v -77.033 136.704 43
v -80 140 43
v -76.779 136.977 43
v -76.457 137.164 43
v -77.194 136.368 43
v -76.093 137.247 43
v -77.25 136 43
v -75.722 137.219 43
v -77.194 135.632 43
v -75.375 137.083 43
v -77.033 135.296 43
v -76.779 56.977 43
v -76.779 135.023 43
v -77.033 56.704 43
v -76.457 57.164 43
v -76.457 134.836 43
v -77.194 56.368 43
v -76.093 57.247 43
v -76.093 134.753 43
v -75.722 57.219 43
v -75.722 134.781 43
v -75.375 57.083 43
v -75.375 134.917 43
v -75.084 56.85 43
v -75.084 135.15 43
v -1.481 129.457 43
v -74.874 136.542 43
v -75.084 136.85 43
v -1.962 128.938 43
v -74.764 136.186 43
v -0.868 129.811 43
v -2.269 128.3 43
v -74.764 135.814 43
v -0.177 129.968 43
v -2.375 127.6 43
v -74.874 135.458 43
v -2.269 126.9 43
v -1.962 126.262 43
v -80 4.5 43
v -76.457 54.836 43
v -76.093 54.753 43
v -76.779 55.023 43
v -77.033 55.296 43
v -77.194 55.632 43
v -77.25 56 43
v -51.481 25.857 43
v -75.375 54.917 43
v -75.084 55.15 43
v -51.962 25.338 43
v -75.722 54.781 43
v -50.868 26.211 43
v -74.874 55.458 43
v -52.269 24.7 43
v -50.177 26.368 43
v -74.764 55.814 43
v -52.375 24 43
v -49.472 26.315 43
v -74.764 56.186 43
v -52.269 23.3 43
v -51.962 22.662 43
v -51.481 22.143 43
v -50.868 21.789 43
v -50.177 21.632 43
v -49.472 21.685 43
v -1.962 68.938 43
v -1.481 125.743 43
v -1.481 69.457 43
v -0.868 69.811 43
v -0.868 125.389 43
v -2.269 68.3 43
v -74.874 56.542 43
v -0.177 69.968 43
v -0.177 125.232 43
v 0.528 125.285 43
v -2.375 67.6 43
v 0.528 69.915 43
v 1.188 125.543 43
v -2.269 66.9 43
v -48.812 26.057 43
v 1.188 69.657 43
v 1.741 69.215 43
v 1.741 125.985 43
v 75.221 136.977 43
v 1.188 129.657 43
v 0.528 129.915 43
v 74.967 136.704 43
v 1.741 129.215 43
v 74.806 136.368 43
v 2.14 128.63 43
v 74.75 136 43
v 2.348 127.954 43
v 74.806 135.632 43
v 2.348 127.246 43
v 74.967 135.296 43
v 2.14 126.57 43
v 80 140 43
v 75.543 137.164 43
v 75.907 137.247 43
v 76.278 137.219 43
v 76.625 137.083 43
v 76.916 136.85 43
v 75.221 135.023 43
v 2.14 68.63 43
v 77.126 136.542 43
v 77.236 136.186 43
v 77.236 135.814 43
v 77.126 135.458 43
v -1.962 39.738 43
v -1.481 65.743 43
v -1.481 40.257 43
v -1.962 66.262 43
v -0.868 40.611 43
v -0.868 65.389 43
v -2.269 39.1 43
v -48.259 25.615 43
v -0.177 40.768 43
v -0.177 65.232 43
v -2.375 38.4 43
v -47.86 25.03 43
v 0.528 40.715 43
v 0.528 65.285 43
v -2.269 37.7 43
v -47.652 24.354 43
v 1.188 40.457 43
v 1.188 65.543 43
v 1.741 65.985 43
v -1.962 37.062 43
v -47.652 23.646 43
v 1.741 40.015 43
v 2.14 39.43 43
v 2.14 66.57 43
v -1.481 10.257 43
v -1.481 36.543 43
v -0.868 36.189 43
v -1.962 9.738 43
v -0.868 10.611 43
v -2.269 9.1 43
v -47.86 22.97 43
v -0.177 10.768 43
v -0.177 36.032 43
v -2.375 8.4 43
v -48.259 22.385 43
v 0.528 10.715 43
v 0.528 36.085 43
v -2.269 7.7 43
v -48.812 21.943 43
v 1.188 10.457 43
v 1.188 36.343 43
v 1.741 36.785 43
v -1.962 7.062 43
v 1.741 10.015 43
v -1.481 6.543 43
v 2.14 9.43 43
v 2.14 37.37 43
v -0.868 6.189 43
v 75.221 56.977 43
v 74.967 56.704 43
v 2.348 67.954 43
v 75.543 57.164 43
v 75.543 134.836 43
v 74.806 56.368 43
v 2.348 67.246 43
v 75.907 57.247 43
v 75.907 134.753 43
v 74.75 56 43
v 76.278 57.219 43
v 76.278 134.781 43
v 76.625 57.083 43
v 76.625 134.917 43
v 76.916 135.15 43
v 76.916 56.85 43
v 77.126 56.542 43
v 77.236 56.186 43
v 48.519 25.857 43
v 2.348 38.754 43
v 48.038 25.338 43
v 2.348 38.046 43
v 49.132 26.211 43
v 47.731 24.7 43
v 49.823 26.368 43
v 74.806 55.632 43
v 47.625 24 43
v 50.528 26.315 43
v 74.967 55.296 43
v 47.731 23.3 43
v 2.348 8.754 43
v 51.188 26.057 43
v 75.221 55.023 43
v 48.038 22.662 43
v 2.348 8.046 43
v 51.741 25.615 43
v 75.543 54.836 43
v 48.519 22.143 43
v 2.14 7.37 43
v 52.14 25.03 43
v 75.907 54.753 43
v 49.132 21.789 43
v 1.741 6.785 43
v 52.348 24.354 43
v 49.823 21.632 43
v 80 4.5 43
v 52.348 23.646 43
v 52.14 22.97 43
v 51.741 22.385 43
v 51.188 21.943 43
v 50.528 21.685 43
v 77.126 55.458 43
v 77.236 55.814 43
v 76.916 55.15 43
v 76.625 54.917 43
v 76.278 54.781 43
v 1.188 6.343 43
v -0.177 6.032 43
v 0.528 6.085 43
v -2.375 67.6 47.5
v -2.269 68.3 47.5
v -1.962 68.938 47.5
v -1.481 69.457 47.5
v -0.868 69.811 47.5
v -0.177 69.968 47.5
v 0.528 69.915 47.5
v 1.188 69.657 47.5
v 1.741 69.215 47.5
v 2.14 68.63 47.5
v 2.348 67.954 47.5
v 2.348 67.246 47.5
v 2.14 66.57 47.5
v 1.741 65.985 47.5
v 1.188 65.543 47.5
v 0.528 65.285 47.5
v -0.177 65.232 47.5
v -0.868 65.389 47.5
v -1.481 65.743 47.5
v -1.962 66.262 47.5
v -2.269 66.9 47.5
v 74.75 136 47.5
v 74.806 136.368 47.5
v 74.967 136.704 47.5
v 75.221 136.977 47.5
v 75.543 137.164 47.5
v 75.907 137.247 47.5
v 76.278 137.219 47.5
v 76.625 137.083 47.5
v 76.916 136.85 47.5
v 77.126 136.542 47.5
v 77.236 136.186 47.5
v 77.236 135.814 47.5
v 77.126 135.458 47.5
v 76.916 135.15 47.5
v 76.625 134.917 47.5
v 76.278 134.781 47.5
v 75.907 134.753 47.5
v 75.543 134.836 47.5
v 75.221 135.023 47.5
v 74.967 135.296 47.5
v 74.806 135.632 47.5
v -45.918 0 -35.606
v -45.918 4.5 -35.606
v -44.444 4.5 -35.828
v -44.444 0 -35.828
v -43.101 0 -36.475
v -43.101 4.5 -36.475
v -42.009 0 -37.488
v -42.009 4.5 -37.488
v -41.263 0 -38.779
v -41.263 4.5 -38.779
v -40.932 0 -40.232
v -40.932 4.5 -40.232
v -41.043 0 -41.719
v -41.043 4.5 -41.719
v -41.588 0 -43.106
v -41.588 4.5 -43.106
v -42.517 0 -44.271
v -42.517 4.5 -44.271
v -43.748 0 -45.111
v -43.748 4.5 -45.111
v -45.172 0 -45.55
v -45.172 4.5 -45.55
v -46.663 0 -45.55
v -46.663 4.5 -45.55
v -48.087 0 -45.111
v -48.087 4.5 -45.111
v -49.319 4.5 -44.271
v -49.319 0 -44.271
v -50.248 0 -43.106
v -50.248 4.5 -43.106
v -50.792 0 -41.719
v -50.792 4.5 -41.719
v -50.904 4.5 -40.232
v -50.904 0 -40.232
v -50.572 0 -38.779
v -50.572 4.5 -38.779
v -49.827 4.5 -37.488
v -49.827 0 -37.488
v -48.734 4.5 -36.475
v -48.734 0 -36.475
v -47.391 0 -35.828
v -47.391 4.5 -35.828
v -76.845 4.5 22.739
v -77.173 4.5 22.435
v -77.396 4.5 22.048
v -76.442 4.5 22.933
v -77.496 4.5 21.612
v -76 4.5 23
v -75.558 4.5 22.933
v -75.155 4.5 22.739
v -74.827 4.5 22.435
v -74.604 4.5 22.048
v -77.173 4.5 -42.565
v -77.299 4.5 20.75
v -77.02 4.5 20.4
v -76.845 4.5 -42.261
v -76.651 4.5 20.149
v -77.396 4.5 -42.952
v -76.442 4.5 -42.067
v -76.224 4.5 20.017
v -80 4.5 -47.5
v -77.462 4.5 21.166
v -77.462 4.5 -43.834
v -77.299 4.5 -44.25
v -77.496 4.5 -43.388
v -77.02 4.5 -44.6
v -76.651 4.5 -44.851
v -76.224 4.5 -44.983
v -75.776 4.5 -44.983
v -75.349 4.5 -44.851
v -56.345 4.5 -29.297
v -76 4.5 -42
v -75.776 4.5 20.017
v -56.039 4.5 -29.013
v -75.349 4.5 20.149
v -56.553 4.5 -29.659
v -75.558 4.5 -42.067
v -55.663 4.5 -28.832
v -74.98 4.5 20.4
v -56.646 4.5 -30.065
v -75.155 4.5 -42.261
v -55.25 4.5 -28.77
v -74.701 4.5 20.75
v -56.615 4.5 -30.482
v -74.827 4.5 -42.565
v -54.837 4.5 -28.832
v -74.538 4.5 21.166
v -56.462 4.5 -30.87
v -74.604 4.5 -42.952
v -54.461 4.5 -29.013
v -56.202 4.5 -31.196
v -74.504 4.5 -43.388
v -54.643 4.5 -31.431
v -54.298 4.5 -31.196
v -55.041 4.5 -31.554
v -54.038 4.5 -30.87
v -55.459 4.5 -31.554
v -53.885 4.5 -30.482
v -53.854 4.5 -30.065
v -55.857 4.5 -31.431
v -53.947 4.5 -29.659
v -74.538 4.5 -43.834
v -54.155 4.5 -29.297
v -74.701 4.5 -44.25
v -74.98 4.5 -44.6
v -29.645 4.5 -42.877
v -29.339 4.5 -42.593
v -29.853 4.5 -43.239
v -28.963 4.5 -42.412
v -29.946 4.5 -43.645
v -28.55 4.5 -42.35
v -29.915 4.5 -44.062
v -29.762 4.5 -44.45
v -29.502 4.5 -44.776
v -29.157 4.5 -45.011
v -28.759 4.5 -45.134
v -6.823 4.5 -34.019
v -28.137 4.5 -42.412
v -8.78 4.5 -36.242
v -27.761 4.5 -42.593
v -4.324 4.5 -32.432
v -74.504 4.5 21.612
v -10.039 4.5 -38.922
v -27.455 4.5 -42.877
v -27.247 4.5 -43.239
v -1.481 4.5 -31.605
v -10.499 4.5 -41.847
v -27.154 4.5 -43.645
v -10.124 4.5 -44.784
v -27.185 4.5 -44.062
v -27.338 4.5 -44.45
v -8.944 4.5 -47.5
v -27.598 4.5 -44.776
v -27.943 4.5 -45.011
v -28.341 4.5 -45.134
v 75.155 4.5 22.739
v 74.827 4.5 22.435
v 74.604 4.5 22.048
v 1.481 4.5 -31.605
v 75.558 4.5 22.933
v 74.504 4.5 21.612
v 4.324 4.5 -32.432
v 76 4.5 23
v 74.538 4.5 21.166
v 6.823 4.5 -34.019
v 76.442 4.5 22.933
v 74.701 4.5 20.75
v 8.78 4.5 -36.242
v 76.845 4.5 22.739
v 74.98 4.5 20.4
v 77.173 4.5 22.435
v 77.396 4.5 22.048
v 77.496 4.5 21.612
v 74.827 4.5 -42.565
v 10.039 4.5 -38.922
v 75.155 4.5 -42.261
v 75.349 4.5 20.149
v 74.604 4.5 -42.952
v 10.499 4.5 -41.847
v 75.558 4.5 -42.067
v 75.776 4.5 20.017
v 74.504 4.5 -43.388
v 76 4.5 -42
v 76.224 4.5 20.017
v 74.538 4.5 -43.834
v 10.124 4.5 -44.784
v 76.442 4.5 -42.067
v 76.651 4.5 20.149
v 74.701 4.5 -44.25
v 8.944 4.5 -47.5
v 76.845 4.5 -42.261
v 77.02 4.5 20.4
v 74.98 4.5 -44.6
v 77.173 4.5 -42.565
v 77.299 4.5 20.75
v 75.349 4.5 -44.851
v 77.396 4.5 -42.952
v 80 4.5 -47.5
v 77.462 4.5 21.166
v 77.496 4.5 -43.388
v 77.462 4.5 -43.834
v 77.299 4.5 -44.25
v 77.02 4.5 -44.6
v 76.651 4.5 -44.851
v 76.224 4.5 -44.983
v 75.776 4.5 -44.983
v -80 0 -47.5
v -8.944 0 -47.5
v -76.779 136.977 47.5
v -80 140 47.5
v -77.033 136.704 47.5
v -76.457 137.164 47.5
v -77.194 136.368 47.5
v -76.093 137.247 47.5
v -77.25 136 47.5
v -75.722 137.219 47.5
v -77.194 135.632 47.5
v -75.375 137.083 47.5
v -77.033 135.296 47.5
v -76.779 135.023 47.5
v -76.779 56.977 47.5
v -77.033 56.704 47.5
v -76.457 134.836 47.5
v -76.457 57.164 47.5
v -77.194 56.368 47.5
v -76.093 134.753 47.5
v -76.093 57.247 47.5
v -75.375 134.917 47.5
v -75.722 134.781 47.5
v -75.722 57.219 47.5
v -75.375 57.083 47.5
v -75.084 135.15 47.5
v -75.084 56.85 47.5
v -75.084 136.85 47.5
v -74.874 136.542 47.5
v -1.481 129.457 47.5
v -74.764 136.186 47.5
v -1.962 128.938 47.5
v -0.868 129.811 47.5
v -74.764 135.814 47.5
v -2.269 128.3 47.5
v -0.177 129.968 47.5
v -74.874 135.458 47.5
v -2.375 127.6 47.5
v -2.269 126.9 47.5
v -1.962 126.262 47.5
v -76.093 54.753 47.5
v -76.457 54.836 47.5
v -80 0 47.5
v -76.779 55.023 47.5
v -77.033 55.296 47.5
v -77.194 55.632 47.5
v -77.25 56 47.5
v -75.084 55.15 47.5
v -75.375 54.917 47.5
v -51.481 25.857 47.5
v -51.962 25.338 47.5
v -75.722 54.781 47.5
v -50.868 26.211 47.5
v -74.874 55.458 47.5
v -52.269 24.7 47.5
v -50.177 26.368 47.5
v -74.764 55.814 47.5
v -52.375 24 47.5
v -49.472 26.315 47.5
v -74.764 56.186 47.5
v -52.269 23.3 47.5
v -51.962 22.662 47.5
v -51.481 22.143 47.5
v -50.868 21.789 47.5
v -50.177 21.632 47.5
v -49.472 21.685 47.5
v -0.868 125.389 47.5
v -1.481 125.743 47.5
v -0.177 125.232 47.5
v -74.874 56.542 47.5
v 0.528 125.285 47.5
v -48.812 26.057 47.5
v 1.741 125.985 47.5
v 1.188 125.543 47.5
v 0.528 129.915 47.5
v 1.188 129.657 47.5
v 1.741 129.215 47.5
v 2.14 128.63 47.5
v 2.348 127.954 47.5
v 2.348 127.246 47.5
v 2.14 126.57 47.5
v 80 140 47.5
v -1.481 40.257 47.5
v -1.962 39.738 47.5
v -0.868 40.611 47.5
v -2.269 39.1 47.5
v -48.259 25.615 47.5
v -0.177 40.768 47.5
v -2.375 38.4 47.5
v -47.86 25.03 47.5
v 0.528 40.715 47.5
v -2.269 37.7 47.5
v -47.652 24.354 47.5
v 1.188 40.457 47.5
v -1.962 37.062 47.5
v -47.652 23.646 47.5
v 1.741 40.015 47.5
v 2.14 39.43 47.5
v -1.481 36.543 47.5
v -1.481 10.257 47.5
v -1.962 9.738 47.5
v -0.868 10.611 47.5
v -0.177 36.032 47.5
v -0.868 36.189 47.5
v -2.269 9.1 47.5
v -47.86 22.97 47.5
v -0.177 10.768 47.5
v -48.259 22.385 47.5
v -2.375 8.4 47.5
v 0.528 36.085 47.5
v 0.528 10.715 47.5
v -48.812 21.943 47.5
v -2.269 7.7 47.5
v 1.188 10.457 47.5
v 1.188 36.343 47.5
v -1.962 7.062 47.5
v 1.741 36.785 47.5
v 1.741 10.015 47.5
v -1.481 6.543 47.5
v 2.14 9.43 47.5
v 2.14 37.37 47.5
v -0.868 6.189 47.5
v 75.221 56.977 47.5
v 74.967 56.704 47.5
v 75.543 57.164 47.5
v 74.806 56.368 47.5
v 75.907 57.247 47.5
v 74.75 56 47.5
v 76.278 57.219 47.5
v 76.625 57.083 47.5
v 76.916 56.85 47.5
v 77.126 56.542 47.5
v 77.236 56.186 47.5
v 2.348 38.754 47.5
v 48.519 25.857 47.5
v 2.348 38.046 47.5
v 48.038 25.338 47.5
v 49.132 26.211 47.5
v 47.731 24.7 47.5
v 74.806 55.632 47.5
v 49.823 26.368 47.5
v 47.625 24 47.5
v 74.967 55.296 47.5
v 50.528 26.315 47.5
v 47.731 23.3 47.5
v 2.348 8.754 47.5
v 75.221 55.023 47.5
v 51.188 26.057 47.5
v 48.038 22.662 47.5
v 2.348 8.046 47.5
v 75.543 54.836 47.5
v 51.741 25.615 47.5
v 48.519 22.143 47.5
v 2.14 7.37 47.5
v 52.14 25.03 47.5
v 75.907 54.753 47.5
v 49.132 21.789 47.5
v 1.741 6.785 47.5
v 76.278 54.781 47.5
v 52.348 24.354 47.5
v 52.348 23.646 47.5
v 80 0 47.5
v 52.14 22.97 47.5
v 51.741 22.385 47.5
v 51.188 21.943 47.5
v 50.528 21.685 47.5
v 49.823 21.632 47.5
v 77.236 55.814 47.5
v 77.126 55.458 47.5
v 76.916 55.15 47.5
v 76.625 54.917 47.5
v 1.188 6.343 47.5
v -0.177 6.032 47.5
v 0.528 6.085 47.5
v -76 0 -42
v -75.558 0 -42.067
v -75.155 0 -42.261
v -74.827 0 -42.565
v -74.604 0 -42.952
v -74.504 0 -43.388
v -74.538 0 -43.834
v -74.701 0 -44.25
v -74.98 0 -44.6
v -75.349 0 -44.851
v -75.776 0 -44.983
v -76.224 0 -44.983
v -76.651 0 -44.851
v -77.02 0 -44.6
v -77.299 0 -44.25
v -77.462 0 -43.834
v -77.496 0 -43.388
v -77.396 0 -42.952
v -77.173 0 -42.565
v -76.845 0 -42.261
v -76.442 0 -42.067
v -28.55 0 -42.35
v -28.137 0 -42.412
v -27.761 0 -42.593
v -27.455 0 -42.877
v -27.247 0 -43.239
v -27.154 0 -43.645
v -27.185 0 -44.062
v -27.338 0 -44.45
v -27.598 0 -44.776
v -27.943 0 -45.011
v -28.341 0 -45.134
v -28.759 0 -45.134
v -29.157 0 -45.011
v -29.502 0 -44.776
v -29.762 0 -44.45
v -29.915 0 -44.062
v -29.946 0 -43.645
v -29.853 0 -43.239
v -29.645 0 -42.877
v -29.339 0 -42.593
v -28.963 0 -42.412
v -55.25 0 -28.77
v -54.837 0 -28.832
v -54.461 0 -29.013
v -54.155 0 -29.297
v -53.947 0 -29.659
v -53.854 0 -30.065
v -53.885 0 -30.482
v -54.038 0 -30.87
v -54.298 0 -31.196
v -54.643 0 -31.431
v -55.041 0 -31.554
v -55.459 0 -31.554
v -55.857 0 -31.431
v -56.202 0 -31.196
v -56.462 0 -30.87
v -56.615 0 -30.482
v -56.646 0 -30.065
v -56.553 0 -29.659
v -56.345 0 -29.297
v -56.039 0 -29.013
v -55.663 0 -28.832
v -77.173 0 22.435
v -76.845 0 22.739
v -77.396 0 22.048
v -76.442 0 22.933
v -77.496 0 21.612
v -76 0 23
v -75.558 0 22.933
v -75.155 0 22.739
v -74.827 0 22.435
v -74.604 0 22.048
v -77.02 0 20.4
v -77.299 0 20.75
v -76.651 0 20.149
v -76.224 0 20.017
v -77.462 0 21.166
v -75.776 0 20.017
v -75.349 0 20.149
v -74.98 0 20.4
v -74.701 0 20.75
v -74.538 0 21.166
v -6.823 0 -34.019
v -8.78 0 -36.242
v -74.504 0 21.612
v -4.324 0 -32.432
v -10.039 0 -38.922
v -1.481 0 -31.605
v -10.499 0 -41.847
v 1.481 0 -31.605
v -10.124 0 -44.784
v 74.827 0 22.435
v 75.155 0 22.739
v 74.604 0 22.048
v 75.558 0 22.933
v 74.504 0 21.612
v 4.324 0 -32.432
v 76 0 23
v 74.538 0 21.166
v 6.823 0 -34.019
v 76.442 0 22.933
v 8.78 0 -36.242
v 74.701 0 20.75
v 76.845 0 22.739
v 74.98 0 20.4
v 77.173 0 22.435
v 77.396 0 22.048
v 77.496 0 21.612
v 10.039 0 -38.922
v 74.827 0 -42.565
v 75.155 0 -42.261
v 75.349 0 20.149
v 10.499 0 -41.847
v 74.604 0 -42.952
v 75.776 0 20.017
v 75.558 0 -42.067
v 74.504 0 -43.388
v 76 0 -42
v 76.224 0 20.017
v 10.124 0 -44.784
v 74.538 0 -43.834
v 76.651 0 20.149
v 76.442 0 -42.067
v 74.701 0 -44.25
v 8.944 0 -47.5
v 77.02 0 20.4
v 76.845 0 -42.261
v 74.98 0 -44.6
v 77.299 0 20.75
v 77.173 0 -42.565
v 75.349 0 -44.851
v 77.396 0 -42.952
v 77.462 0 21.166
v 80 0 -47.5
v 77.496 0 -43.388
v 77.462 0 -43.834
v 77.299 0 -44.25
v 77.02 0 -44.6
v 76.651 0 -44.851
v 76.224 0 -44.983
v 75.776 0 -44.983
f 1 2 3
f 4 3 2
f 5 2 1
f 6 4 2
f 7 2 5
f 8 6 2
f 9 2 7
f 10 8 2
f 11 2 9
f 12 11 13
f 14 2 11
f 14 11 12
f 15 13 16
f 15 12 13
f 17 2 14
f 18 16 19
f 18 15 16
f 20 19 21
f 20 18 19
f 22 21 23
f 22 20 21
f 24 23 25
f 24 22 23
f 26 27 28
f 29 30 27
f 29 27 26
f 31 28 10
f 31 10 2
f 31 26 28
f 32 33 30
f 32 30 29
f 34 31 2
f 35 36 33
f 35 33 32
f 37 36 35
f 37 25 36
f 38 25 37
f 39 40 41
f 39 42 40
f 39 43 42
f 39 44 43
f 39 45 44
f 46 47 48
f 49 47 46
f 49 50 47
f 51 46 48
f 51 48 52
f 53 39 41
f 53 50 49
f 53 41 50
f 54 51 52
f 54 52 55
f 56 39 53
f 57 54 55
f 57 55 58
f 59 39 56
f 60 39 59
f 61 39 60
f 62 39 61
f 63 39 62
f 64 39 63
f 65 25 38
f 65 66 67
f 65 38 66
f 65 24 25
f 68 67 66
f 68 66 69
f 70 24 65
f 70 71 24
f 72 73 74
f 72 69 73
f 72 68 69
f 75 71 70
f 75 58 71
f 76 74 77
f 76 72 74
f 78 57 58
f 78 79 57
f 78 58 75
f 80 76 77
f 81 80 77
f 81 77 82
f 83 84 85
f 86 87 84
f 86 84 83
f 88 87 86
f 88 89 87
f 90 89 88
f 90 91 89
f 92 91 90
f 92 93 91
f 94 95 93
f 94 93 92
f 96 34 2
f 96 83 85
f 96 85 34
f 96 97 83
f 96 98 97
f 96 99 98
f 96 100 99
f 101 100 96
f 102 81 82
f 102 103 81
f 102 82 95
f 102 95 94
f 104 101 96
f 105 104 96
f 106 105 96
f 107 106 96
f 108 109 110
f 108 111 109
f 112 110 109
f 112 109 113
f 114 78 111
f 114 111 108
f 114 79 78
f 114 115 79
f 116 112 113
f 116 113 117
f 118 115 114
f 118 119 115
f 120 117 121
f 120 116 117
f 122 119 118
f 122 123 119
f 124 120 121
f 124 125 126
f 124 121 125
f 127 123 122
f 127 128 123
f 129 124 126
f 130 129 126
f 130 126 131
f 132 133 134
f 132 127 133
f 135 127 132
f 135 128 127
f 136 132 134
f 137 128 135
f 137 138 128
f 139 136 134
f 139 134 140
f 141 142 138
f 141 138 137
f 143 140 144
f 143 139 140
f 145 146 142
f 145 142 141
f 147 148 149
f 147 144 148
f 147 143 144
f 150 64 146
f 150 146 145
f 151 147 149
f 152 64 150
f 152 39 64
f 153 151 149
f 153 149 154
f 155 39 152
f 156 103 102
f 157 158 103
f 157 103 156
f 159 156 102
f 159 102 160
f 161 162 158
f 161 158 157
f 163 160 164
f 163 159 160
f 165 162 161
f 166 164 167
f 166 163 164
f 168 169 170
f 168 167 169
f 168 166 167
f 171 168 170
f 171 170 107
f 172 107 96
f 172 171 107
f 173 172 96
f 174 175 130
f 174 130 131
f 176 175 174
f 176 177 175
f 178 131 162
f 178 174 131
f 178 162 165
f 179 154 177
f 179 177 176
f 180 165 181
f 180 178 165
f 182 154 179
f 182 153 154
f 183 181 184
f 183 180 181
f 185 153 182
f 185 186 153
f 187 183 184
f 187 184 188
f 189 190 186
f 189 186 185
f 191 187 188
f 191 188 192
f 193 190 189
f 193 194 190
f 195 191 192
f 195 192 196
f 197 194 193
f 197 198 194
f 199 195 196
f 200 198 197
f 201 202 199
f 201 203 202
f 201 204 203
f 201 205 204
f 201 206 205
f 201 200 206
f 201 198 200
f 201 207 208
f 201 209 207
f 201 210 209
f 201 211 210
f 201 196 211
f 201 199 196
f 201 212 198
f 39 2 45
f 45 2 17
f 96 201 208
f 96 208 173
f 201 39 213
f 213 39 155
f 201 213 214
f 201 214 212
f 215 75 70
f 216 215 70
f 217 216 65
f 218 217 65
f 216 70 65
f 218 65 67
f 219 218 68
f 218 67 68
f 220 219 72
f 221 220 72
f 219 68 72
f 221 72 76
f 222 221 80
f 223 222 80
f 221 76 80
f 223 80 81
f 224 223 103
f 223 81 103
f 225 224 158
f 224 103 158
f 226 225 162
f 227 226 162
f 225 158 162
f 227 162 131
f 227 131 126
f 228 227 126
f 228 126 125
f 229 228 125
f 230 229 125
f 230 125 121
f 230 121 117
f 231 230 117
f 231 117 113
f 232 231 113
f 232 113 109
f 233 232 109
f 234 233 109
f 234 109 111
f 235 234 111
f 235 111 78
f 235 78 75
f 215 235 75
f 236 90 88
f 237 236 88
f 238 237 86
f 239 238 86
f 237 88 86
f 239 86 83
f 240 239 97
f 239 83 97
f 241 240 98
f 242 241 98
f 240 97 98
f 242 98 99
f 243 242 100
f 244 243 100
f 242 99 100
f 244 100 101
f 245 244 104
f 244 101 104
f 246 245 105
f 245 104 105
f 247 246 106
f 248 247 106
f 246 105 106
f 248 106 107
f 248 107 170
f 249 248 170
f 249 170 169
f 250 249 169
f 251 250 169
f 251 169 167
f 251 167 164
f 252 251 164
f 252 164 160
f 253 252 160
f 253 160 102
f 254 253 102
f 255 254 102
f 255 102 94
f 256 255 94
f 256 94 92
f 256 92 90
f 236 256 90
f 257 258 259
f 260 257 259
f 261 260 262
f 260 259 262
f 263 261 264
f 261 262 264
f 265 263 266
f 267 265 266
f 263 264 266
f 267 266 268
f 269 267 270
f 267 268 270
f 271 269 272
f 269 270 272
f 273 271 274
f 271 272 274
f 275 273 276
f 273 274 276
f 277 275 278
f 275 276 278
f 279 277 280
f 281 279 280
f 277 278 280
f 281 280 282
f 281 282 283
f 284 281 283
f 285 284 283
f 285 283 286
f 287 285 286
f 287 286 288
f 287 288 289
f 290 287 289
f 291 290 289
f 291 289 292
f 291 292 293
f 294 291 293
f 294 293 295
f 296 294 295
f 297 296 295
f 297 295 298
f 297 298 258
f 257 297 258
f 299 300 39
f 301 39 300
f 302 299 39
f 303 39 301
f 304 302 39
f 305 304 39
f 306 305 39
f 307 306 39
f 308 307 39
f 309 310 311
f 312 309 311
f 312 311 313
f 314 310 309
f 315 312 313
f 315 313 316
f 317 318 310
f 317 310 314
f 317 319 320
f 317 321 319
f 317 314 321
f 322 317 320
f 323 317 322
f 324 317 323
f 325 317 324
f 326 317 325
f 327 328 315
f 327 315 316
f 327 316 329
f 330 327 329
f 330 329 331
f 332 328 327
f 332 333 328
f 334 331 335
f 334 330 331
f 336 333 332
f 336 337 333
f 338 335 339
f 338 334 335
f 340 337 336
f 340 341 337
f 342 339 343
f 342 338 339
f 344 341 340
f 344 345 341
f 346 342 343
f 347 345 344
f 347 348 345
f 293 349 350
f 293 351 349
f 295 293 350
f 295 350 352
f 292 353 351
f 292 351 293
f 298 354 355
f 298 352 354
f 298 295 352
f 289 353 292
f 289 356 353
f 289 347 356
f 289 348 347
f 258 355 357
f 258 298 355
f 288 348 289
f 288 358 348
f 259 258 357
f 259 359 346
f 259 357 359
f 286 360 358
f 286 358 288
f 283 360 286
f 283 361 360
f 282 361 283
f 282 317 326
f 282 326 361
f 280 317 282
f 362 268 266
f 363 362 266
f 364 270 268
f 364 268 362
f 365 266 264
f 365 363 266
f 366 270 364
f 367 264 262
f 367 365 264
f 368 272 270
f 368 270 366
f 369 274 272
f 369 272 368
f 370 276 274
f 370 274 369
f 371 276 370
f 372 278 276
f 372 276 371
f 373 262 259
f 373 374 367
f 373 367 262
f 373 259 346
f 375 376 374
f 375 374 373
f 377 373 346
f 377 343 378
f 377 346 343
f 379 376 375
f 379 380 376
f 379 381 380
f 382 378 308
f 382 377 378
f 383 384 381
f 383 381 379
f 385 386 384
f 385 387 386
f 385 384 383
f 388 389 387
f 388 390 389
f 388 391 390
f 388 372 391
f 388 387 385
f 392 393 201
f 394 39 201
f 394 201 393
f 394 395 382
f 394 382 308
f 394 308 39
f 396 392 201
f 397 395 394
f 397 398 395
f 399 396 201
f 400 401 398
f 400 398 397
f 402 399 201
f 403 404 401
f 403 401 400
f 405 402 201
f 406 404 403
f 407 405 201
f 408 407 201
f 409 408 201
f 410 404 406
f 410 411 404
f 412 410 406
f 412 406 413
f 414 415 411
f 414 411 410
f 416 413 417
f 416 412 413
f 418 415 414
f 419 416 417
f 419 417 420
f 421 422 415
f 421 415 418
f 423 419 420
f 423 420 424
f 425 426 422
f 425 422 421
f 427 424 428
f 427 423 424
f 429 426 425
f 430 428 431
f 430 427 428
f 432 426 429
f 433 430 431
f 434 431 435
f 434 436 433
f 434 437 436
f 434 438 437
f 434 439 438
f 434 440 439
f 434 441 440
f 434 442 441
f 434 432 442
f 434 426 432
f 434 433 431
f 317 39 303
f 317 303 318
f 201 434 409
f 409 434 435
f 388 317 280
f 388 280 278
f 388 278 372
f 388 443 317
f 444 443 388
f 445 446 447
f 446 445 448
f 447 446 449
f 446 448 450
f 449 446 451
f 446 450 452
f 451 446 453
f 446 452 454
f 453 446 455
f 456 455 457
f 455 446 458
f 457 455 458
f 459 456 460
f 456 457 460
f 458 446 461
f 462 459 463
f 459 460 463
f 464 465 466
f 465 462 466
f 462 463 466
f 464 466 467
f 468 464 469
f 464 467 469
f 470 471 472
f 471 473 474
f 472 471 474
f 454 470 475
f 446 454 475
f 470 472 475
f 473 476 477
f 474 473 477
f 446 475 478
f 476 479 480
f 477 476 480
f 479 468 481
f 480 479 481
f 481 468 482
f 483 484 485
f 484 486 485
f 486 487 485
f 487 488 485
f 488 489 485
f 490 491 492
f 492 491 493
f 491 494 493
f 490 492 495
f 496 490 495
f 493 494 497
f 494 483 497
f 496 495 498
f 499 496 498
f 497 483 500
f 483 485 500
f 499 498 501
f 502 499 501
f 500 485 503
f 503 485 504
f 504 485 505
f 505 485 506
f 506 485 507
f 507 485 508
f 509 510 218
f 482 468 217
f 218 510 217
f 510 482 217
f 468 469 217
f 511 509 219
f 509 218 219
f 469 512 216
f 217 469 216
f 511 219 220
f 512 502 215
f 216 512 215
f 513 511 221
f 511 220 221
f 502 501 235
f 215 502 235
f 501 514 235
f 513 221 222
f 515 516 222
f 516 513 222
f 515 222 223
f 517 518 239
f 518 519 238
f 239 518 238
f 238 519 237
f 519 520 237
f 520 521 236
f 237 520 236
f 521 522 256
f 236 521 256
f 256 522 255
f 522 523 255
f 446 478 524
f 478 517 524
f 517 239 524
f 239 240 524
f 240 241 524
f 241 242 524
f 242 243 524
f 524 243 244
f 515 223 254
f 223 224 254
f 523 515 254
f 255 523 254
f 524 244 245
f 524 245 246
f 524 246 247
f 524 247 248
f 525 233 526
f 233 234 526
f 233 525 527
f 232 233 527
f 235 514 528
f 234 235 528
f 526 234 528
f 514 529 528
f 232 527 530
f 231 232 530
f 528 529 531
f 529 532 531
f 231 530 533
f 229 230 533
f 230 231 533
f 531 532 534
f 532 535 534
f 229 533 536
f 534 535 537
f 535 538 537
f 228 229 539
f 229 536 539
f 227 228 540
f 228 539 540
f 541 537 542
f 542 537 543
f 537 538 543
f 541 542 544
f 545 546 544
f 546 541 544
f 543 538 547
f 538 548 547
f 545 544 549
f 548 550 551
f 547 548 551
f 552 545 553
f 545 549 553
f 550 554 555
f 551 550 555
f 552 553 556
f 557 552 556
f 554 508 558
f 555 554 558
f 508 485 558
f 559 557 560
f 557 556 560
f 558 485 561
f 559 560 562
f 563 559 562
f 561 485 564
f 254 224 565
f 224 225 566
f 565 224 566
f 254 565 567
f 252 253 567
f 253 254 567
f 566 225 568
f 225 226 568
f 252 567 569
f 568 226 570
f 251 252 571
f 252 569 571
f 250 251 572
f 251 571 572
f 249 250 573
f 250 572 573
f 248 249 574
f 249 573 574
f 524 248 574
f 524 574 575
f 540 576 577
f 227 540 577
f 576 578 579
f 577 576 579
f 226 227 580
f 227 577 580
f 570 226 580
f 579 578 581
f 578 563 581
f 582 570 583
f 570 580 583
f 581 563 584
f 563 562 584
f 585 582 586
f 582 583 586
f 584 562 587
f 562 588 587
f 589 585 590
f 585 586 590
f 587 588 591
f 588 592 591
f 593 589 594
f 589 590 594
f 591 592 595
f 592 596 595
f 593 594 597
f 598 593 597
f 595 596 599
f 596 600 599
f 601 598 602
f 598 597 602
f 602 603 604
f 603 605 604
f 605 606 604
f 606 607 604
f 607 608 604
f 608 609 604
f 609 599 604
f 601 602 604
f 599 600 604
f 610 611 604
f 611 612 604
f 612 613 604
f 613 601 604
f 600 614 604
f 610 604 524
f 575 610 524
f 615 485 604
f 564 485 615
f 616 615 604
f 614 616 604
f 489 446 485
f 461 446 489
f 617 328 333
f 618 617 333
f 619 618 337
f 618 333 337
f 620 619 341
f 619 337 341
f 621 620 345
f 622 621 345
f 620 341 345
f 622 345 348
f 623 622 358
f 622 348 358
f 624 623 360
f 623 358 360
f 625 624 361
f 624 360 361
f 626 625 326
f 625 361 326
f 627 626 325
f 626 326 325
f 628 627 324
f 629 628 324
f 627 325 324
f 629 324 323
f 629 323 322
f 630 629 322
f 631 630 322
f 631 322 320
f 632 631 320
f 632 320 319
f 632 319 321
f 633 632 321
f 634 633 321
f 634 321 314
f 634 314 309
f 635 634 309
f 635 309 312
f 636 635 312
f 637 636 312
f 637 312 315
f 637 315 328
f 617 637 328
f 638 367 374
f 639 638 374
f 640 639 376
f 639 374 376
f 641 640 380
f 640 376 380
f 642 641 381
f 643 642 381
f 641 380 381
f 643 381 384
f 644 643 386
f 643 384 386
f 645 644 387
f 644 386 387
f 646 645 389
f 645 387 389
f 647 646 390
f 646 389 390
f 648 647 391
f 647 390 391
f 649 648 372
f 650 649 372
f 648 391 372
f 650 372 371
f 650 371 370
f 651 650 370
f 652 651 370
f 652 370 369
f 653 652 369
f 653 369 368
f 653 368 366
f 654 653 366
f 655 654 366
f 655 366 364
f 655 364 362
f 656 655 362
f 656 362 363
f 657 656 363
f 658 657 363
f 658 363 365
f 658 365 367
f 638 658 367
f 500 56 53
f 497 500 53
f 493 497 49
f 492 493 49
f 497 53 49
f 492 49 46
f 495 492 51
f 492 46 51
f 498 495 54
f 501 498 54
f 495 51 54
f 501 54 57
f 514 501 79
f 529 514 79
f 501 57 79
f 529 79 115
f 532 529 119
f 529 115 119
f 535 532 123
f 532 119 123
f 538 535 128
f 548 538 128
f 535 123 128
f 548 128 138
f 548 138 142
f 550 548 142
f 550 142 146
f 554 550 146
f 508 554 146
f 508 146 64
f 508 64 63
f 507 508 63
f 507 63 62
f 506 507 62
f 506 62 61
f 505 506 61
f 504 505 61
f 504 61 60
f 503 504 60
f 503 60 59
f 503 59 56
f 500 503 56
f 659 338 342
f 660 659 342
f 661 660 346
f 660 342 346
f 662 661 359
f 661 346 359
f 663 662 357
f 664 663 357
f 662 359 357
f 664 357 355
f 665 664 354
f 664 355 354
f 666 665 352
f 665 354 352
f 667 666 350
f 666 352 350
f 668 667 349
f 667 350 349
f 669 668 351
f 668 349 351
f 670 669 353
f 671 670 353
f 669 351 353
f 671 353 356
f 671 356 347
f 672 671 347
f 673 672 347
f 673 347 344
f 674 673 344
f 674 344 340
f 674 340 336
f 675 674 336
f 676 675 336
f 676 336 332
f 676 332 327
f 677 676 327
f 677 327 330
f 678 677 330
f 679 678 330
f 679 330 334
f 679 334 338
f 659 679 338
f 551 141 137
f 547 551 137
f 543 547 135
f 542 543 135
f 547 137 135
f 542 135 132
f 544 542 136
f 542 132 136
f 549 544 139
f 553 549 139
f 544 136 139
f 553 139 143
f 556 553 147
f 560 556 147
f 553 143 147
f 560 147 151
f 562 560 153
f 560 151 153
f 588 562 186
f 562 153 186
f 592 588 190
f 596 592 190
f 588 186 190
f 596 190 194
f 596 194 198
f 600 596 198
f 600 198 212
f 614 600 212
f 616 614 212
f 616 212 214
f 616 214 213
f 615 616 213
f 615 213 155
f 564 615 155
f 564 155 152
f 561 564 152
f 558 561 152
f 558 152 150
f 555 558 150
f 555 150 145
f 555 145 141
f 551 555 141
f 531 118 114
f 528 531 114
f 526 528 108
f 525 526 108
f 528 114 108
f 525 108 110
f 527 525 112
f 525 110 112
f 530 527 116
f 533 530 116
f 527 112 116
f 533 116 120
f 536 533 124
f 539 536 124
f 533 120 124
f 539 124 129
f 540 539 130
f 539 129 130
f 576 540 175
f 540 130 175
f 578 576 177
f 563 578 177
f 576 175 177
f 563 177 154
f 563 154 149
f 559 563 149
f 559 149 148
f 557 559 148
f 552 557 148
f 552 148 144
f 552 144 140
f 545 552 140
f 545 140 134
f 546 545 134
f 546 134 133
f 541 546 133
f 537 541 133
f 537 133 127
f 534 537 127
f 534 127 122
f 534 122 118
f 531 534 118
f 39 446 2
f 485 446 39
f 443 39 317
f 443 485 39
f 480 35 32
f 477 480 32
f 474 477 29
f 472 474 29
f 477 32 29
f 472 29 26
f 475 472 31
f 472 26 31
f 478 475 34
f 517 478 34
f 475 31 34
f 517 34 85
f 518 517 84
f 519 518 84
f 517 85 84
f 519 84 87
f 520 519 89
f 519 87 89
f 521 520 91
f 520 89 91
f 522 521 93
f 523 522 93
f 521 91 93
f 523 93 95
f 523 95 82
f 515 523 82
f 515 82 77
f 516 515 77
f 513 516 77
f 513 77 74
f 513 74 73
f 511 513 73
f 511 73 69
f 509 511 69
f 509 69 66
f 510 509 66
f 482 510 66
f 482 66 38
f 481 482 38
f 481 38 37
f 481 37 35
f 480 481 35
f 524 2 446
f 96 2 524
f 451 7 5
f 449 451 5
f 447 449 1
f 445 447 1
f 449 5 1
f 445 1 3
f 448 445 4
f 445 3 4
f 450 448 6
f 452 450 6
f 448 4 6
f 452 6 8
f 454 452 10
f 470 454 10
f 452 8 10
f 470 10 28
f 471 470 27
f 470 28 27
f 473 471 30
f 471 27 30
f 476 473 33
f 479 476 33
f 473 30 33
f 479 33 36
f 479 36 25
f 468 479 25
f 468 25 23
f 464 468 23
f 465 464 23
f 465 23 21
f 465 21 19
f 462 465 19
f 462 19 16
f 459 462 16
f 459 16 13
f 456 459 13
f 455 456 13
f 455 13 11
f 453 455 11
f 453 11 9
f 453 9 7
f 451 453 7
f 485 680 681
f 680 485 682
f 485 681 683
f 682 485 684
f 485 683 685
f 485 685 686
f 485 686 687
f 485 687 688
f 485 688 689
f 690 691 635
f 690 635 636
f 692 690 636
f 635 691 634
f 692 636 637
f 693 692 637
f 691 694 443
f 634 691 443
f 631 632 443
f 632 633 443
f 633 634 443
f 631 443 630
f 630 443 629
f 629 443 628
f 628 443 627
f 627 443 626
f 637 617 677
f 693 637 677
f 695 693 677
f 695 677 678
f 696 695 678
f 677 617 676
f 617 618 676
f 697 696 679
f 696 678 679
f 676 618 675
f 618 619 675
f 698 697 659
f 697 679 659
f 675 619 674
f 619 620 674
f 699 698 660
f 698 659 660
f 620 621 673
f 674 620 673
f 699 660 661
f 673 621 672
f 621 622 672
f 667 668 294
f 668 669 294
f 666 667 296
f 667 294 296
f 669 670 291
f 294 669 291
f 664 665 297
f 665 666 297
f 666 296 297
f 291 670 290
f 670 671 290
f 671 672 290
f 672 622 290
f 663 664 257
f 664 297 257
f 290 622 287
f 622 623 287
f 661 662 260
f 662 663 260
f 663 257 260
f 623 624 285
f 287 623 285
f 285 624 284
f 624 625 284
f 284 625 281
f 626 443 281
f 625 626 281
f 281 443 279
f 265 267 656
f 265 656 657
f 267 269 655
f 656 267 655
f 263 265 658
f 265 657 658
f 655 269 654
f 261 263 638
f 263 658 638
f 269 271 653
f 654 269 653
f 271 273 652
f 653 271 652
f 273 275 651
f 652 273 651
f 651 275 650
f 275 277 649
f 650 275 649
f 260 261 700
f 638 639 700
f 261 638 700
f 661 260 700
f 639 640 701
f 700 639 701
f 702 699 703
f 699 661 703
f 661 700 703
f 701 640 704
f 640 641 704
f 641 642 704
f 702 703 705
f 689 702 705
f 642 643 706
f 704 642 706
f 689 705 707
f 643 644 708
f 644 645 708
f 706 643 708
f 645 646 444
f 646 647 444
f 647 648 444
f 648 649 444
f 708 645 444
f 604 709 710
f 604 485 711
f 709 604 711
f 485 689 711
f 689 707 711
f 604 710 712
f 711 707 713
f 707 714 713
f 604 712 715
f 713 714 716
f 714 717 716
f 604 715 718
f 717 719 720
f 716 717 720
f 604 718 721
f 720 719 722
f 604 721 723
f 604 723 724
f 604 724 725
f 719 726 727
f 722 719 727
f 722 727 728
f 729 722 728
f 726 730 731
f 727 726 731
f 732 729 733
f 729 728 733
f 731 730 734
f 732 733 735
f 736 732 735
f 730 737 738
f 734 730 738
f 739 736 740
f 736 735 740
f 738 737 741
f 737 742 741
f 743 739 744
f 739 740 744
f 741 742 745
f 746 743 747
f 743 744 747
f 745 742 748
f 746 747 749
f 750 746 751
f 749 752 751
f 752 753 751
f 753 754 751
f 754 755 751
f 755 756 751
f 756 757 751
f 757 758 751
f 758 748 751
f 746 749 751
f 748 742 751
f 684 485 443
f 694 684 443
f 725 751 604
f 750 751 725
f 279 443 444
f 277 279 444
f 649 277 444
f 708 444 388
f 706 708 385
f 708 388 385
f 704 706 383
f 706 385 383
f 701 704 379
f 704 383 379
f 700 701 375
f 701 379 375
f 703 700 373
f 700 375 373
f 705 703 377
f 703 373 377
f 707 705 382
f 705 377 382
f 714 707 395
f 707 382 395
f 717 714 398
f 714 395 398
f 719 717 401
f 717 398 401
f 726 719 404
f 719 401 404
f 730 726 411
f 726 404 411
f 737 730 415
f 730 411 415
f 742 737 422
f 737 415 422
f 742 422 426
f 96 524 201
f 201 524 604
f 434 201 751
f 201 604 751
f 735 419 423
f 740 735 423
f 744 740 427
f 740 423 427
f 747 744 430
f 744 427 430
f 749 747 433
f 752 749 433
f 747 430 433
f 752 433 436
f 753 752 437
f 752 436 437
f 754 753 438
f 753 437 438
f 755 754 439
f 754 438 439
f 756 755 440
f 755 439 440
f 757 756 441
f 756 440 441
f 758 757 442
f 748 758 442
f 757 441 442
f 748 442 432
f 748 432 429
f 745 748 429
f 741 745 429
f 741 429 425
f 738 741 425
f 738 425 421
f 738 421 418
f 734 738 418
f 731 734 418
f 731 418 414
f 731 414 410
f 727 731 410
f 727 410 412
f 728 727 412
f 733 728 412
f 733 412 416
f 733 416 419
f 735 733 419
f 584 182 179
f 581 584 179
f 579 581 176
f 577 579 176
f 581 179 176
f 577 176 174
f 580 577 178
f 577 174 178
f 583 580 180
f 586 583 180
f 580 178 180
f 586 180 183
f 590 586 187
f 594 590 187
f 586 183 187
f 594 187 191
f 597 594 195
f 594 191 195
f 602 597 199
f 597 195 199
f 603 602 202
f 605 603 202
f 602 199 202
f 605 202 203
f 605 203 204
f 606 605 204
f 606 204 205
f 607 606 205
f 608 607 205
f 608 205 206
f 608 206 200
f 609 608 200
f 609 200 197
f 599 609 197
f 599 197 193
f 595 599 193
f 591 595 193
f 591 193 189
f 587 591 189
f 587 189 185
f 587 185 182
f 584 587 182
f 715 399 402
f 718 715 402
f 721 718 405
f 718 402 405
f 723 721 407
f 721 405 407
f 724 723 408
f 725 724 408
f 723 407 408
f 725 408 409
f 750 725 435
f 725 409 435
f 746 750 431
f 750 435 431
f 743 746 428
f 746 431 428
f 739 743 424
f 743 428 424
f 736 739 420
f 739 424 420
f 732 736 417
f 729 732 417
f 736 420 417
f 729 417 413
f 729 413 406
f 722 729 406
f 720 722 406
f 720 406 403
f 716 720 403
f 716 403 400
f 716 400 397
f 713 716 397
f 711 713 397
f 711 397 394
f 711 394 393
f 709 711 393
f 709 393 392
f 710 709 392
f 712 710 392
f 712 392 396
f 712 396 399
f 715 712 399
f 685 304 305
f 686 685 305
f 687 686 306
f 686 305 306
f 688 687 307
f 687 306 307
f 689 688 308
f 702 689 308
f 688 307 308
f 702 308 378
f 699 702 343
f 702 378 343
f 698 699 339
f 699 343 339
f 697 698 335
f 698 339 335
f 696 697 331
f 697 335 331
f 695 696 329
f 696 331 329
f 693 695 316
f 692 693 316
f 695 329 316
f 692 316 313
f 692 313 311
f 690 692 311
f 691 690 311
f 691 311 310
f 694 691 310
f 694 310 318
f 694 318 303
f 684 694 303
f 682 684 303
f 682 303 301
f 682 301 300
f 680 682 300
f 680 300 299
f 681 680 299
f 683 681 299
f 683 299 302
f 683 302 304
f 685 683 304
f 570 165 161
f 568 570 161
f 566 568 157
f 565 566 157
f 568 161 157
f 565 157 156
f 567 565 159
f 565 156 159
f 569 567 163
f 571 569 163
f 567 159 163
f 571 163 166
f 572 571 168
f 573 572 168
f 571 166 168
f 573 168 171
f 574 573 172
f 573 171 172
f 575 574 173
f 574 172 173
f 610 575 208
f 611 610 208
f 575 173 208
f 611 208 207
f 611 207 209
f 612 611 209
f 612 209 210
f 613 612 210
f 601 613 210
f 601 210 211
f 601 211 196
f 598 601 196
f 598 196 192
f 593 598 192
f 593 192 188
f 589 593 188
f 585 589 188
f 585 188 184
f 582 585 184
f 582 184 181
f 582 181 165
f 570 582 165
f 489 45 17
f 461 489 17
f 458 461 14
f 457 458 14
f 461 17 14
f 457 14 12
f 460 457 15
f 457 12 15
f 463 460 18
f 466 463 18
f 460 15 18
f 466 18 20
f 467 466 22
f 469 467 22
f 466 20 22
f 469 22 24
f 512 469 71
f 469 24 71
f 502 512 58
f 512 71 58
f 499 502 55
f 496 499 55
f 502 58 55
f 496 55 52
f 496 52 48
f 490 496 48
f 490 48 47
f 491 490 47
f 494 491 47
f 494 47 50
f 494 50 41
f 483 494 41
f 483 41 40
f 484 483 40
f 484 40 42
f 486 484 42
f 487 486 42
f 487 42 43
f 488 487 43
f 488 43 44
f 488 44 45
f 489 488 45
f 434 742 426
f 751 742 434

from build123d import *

# Parameters (mm, degrees)
SKETCH1_W           = 160
SKETCH1_H           = 95
BOSS_EXTRUDE1_DEPTH = 4.5
SKETCH2_R           = 1.5
CUT_EXTRUDE1_DEPTH  = 5
SKETCH5_W           = 160
SKETCH5_H           = 4.5
BOSS_EXTRUDE2_DEPTH = 135.5
SKETCH7_R           = 1.25
CUT_EXTRUDE2_DEPTH  = 5
SKETCH9_R           = 10.5
SKETCH9_R_2         = 5
SKETCH9_R_3         = 1.4
CUT_EXTRUDE3_DEPTH  = 5
SKETCH10_R          = 2.375
CUT_EXTRUDE4_DEPTH  = 10


with BuildPart() as part:
    # Sketch1 → Boss-Extrude1 (new body)
    with BuildSketch(Plane(origin=(0, 0, 0), x_dir=(1, 0, 0), z_dir=(0, 1, 0))):
        Rectangle(SKETCH1_W, SKETCH1_H)
    extrude(amount=BOSS_EXTRUDE1_DEPTH)

    # Sketch2 → Cut-Extrude1 (cut)
    with BuildSketch(Plane(origin=(0, 4.5, 0), x_dir=(1, 0, 0), z_dir=(0, 1, 0))):
        with Locations(Location((76, -21.5, 0), (0, 0, 270))):
            Circle(SKETCH2_R)
        with Locations(Location((-76, -21.5, 0), (0, 0, 270))):
            Circle(SKETCH2_R)
        with Locations(Location((-76, 43.5, 0), (0, 0, 270))):
            Circle(SKETCH2_R)
        with Locations(Location((76, 43.5, 0), (0, 0, 270))):
            Circle(SKETCH2_R)
    extrude(amount=-CUT_EXTRUDE1_DEPTH, mode=Mode.SUBTRACT)

    # Sketch5 → Boss-Extrude2 (add)
    with BuildSketch(Plane(origin=(0, 4.5, 0), x_dir=(1, 0, 0), z_dir=(0, 1, 0))):
        with Locations((0, -45.25)):
            Rectangle(SKETCH5_W, SKETCH5_H)
    extrude(amount=BOSS_EXTRUDE2_DEPTH)

    # Sketch7 → Cut-Extrude2 (cut)
    with BuildSketch(Plane(origin=(0, 0, 43), x_dir=(-1, 0, 0), z_dir=(0, 0, -1))):
        with Locations((76, 136)):
            Circle(SKETCH7_R)
        with Locations((-76, 136)):
            Circle(SKETCH7_R)
        with Locations((-76, 56)):
            Circle(SKETCH7_R)
        with Locations((76, 56)):
            Circle(SKETCH7_R)
    extrude(amount=-CUT_EXTRUDE2_DEPTH, mode=Mode.SUBTRACT)

    # Sketch9 → Cut-Extrude3 (cut)
    with BuildSketch(Plane(origin=(0, 4.5, 0), x_dir=(1, 0, 0), z_dir=(0, 1, 0))):
        with Locations((0, 42)):
            Circle(SKETCH9_R)
        with Locations(Location((-45.917706268, 40.60591365, 0), (0, 0, 270))):
            Circle(SKETCH9_R_2)
        with Locations(Location((-28.55, 43.75, 0), (0, 0, 270))):
            Circle(SKETCH9_R_3)
        with Locations(Location((-55.25, 30.17, 0), (0, 0, 270))):
            Circle(SKETCH9_R_3)
    extrude(amount=-CUT_EXTRUDE3_DEPTH, mode=Mode.SUBTRACT)

    # Sketch10 → Cut-Extrude4 (cut)
    with BuildSketch(Plane(origin=(0, 0, 43), x_dir=(-1, 0, 0), z_dir=(0, 0, -1))):
        with Locations((0, 8.4)):
            Circle(SKETCH10_R)
        with Locations((0, 38.4)):
            Circle(SKETCH10_R)
        with Locations((0, 67.6)):
            Circle(SKETCH10_R)
        with Locations((0, 127.6)):
            Circle(SKETCH10_R)
        with Locations((-50, 24)):
            Circle(SKETCH10_R)
        with Locations((50, 24)):
            Circle(SKETCH10_R)
    extrude(amount=-CUT_EXTRUDE4_DEPTH, mode=Mode.SUBTRACT)


solid = part.part
